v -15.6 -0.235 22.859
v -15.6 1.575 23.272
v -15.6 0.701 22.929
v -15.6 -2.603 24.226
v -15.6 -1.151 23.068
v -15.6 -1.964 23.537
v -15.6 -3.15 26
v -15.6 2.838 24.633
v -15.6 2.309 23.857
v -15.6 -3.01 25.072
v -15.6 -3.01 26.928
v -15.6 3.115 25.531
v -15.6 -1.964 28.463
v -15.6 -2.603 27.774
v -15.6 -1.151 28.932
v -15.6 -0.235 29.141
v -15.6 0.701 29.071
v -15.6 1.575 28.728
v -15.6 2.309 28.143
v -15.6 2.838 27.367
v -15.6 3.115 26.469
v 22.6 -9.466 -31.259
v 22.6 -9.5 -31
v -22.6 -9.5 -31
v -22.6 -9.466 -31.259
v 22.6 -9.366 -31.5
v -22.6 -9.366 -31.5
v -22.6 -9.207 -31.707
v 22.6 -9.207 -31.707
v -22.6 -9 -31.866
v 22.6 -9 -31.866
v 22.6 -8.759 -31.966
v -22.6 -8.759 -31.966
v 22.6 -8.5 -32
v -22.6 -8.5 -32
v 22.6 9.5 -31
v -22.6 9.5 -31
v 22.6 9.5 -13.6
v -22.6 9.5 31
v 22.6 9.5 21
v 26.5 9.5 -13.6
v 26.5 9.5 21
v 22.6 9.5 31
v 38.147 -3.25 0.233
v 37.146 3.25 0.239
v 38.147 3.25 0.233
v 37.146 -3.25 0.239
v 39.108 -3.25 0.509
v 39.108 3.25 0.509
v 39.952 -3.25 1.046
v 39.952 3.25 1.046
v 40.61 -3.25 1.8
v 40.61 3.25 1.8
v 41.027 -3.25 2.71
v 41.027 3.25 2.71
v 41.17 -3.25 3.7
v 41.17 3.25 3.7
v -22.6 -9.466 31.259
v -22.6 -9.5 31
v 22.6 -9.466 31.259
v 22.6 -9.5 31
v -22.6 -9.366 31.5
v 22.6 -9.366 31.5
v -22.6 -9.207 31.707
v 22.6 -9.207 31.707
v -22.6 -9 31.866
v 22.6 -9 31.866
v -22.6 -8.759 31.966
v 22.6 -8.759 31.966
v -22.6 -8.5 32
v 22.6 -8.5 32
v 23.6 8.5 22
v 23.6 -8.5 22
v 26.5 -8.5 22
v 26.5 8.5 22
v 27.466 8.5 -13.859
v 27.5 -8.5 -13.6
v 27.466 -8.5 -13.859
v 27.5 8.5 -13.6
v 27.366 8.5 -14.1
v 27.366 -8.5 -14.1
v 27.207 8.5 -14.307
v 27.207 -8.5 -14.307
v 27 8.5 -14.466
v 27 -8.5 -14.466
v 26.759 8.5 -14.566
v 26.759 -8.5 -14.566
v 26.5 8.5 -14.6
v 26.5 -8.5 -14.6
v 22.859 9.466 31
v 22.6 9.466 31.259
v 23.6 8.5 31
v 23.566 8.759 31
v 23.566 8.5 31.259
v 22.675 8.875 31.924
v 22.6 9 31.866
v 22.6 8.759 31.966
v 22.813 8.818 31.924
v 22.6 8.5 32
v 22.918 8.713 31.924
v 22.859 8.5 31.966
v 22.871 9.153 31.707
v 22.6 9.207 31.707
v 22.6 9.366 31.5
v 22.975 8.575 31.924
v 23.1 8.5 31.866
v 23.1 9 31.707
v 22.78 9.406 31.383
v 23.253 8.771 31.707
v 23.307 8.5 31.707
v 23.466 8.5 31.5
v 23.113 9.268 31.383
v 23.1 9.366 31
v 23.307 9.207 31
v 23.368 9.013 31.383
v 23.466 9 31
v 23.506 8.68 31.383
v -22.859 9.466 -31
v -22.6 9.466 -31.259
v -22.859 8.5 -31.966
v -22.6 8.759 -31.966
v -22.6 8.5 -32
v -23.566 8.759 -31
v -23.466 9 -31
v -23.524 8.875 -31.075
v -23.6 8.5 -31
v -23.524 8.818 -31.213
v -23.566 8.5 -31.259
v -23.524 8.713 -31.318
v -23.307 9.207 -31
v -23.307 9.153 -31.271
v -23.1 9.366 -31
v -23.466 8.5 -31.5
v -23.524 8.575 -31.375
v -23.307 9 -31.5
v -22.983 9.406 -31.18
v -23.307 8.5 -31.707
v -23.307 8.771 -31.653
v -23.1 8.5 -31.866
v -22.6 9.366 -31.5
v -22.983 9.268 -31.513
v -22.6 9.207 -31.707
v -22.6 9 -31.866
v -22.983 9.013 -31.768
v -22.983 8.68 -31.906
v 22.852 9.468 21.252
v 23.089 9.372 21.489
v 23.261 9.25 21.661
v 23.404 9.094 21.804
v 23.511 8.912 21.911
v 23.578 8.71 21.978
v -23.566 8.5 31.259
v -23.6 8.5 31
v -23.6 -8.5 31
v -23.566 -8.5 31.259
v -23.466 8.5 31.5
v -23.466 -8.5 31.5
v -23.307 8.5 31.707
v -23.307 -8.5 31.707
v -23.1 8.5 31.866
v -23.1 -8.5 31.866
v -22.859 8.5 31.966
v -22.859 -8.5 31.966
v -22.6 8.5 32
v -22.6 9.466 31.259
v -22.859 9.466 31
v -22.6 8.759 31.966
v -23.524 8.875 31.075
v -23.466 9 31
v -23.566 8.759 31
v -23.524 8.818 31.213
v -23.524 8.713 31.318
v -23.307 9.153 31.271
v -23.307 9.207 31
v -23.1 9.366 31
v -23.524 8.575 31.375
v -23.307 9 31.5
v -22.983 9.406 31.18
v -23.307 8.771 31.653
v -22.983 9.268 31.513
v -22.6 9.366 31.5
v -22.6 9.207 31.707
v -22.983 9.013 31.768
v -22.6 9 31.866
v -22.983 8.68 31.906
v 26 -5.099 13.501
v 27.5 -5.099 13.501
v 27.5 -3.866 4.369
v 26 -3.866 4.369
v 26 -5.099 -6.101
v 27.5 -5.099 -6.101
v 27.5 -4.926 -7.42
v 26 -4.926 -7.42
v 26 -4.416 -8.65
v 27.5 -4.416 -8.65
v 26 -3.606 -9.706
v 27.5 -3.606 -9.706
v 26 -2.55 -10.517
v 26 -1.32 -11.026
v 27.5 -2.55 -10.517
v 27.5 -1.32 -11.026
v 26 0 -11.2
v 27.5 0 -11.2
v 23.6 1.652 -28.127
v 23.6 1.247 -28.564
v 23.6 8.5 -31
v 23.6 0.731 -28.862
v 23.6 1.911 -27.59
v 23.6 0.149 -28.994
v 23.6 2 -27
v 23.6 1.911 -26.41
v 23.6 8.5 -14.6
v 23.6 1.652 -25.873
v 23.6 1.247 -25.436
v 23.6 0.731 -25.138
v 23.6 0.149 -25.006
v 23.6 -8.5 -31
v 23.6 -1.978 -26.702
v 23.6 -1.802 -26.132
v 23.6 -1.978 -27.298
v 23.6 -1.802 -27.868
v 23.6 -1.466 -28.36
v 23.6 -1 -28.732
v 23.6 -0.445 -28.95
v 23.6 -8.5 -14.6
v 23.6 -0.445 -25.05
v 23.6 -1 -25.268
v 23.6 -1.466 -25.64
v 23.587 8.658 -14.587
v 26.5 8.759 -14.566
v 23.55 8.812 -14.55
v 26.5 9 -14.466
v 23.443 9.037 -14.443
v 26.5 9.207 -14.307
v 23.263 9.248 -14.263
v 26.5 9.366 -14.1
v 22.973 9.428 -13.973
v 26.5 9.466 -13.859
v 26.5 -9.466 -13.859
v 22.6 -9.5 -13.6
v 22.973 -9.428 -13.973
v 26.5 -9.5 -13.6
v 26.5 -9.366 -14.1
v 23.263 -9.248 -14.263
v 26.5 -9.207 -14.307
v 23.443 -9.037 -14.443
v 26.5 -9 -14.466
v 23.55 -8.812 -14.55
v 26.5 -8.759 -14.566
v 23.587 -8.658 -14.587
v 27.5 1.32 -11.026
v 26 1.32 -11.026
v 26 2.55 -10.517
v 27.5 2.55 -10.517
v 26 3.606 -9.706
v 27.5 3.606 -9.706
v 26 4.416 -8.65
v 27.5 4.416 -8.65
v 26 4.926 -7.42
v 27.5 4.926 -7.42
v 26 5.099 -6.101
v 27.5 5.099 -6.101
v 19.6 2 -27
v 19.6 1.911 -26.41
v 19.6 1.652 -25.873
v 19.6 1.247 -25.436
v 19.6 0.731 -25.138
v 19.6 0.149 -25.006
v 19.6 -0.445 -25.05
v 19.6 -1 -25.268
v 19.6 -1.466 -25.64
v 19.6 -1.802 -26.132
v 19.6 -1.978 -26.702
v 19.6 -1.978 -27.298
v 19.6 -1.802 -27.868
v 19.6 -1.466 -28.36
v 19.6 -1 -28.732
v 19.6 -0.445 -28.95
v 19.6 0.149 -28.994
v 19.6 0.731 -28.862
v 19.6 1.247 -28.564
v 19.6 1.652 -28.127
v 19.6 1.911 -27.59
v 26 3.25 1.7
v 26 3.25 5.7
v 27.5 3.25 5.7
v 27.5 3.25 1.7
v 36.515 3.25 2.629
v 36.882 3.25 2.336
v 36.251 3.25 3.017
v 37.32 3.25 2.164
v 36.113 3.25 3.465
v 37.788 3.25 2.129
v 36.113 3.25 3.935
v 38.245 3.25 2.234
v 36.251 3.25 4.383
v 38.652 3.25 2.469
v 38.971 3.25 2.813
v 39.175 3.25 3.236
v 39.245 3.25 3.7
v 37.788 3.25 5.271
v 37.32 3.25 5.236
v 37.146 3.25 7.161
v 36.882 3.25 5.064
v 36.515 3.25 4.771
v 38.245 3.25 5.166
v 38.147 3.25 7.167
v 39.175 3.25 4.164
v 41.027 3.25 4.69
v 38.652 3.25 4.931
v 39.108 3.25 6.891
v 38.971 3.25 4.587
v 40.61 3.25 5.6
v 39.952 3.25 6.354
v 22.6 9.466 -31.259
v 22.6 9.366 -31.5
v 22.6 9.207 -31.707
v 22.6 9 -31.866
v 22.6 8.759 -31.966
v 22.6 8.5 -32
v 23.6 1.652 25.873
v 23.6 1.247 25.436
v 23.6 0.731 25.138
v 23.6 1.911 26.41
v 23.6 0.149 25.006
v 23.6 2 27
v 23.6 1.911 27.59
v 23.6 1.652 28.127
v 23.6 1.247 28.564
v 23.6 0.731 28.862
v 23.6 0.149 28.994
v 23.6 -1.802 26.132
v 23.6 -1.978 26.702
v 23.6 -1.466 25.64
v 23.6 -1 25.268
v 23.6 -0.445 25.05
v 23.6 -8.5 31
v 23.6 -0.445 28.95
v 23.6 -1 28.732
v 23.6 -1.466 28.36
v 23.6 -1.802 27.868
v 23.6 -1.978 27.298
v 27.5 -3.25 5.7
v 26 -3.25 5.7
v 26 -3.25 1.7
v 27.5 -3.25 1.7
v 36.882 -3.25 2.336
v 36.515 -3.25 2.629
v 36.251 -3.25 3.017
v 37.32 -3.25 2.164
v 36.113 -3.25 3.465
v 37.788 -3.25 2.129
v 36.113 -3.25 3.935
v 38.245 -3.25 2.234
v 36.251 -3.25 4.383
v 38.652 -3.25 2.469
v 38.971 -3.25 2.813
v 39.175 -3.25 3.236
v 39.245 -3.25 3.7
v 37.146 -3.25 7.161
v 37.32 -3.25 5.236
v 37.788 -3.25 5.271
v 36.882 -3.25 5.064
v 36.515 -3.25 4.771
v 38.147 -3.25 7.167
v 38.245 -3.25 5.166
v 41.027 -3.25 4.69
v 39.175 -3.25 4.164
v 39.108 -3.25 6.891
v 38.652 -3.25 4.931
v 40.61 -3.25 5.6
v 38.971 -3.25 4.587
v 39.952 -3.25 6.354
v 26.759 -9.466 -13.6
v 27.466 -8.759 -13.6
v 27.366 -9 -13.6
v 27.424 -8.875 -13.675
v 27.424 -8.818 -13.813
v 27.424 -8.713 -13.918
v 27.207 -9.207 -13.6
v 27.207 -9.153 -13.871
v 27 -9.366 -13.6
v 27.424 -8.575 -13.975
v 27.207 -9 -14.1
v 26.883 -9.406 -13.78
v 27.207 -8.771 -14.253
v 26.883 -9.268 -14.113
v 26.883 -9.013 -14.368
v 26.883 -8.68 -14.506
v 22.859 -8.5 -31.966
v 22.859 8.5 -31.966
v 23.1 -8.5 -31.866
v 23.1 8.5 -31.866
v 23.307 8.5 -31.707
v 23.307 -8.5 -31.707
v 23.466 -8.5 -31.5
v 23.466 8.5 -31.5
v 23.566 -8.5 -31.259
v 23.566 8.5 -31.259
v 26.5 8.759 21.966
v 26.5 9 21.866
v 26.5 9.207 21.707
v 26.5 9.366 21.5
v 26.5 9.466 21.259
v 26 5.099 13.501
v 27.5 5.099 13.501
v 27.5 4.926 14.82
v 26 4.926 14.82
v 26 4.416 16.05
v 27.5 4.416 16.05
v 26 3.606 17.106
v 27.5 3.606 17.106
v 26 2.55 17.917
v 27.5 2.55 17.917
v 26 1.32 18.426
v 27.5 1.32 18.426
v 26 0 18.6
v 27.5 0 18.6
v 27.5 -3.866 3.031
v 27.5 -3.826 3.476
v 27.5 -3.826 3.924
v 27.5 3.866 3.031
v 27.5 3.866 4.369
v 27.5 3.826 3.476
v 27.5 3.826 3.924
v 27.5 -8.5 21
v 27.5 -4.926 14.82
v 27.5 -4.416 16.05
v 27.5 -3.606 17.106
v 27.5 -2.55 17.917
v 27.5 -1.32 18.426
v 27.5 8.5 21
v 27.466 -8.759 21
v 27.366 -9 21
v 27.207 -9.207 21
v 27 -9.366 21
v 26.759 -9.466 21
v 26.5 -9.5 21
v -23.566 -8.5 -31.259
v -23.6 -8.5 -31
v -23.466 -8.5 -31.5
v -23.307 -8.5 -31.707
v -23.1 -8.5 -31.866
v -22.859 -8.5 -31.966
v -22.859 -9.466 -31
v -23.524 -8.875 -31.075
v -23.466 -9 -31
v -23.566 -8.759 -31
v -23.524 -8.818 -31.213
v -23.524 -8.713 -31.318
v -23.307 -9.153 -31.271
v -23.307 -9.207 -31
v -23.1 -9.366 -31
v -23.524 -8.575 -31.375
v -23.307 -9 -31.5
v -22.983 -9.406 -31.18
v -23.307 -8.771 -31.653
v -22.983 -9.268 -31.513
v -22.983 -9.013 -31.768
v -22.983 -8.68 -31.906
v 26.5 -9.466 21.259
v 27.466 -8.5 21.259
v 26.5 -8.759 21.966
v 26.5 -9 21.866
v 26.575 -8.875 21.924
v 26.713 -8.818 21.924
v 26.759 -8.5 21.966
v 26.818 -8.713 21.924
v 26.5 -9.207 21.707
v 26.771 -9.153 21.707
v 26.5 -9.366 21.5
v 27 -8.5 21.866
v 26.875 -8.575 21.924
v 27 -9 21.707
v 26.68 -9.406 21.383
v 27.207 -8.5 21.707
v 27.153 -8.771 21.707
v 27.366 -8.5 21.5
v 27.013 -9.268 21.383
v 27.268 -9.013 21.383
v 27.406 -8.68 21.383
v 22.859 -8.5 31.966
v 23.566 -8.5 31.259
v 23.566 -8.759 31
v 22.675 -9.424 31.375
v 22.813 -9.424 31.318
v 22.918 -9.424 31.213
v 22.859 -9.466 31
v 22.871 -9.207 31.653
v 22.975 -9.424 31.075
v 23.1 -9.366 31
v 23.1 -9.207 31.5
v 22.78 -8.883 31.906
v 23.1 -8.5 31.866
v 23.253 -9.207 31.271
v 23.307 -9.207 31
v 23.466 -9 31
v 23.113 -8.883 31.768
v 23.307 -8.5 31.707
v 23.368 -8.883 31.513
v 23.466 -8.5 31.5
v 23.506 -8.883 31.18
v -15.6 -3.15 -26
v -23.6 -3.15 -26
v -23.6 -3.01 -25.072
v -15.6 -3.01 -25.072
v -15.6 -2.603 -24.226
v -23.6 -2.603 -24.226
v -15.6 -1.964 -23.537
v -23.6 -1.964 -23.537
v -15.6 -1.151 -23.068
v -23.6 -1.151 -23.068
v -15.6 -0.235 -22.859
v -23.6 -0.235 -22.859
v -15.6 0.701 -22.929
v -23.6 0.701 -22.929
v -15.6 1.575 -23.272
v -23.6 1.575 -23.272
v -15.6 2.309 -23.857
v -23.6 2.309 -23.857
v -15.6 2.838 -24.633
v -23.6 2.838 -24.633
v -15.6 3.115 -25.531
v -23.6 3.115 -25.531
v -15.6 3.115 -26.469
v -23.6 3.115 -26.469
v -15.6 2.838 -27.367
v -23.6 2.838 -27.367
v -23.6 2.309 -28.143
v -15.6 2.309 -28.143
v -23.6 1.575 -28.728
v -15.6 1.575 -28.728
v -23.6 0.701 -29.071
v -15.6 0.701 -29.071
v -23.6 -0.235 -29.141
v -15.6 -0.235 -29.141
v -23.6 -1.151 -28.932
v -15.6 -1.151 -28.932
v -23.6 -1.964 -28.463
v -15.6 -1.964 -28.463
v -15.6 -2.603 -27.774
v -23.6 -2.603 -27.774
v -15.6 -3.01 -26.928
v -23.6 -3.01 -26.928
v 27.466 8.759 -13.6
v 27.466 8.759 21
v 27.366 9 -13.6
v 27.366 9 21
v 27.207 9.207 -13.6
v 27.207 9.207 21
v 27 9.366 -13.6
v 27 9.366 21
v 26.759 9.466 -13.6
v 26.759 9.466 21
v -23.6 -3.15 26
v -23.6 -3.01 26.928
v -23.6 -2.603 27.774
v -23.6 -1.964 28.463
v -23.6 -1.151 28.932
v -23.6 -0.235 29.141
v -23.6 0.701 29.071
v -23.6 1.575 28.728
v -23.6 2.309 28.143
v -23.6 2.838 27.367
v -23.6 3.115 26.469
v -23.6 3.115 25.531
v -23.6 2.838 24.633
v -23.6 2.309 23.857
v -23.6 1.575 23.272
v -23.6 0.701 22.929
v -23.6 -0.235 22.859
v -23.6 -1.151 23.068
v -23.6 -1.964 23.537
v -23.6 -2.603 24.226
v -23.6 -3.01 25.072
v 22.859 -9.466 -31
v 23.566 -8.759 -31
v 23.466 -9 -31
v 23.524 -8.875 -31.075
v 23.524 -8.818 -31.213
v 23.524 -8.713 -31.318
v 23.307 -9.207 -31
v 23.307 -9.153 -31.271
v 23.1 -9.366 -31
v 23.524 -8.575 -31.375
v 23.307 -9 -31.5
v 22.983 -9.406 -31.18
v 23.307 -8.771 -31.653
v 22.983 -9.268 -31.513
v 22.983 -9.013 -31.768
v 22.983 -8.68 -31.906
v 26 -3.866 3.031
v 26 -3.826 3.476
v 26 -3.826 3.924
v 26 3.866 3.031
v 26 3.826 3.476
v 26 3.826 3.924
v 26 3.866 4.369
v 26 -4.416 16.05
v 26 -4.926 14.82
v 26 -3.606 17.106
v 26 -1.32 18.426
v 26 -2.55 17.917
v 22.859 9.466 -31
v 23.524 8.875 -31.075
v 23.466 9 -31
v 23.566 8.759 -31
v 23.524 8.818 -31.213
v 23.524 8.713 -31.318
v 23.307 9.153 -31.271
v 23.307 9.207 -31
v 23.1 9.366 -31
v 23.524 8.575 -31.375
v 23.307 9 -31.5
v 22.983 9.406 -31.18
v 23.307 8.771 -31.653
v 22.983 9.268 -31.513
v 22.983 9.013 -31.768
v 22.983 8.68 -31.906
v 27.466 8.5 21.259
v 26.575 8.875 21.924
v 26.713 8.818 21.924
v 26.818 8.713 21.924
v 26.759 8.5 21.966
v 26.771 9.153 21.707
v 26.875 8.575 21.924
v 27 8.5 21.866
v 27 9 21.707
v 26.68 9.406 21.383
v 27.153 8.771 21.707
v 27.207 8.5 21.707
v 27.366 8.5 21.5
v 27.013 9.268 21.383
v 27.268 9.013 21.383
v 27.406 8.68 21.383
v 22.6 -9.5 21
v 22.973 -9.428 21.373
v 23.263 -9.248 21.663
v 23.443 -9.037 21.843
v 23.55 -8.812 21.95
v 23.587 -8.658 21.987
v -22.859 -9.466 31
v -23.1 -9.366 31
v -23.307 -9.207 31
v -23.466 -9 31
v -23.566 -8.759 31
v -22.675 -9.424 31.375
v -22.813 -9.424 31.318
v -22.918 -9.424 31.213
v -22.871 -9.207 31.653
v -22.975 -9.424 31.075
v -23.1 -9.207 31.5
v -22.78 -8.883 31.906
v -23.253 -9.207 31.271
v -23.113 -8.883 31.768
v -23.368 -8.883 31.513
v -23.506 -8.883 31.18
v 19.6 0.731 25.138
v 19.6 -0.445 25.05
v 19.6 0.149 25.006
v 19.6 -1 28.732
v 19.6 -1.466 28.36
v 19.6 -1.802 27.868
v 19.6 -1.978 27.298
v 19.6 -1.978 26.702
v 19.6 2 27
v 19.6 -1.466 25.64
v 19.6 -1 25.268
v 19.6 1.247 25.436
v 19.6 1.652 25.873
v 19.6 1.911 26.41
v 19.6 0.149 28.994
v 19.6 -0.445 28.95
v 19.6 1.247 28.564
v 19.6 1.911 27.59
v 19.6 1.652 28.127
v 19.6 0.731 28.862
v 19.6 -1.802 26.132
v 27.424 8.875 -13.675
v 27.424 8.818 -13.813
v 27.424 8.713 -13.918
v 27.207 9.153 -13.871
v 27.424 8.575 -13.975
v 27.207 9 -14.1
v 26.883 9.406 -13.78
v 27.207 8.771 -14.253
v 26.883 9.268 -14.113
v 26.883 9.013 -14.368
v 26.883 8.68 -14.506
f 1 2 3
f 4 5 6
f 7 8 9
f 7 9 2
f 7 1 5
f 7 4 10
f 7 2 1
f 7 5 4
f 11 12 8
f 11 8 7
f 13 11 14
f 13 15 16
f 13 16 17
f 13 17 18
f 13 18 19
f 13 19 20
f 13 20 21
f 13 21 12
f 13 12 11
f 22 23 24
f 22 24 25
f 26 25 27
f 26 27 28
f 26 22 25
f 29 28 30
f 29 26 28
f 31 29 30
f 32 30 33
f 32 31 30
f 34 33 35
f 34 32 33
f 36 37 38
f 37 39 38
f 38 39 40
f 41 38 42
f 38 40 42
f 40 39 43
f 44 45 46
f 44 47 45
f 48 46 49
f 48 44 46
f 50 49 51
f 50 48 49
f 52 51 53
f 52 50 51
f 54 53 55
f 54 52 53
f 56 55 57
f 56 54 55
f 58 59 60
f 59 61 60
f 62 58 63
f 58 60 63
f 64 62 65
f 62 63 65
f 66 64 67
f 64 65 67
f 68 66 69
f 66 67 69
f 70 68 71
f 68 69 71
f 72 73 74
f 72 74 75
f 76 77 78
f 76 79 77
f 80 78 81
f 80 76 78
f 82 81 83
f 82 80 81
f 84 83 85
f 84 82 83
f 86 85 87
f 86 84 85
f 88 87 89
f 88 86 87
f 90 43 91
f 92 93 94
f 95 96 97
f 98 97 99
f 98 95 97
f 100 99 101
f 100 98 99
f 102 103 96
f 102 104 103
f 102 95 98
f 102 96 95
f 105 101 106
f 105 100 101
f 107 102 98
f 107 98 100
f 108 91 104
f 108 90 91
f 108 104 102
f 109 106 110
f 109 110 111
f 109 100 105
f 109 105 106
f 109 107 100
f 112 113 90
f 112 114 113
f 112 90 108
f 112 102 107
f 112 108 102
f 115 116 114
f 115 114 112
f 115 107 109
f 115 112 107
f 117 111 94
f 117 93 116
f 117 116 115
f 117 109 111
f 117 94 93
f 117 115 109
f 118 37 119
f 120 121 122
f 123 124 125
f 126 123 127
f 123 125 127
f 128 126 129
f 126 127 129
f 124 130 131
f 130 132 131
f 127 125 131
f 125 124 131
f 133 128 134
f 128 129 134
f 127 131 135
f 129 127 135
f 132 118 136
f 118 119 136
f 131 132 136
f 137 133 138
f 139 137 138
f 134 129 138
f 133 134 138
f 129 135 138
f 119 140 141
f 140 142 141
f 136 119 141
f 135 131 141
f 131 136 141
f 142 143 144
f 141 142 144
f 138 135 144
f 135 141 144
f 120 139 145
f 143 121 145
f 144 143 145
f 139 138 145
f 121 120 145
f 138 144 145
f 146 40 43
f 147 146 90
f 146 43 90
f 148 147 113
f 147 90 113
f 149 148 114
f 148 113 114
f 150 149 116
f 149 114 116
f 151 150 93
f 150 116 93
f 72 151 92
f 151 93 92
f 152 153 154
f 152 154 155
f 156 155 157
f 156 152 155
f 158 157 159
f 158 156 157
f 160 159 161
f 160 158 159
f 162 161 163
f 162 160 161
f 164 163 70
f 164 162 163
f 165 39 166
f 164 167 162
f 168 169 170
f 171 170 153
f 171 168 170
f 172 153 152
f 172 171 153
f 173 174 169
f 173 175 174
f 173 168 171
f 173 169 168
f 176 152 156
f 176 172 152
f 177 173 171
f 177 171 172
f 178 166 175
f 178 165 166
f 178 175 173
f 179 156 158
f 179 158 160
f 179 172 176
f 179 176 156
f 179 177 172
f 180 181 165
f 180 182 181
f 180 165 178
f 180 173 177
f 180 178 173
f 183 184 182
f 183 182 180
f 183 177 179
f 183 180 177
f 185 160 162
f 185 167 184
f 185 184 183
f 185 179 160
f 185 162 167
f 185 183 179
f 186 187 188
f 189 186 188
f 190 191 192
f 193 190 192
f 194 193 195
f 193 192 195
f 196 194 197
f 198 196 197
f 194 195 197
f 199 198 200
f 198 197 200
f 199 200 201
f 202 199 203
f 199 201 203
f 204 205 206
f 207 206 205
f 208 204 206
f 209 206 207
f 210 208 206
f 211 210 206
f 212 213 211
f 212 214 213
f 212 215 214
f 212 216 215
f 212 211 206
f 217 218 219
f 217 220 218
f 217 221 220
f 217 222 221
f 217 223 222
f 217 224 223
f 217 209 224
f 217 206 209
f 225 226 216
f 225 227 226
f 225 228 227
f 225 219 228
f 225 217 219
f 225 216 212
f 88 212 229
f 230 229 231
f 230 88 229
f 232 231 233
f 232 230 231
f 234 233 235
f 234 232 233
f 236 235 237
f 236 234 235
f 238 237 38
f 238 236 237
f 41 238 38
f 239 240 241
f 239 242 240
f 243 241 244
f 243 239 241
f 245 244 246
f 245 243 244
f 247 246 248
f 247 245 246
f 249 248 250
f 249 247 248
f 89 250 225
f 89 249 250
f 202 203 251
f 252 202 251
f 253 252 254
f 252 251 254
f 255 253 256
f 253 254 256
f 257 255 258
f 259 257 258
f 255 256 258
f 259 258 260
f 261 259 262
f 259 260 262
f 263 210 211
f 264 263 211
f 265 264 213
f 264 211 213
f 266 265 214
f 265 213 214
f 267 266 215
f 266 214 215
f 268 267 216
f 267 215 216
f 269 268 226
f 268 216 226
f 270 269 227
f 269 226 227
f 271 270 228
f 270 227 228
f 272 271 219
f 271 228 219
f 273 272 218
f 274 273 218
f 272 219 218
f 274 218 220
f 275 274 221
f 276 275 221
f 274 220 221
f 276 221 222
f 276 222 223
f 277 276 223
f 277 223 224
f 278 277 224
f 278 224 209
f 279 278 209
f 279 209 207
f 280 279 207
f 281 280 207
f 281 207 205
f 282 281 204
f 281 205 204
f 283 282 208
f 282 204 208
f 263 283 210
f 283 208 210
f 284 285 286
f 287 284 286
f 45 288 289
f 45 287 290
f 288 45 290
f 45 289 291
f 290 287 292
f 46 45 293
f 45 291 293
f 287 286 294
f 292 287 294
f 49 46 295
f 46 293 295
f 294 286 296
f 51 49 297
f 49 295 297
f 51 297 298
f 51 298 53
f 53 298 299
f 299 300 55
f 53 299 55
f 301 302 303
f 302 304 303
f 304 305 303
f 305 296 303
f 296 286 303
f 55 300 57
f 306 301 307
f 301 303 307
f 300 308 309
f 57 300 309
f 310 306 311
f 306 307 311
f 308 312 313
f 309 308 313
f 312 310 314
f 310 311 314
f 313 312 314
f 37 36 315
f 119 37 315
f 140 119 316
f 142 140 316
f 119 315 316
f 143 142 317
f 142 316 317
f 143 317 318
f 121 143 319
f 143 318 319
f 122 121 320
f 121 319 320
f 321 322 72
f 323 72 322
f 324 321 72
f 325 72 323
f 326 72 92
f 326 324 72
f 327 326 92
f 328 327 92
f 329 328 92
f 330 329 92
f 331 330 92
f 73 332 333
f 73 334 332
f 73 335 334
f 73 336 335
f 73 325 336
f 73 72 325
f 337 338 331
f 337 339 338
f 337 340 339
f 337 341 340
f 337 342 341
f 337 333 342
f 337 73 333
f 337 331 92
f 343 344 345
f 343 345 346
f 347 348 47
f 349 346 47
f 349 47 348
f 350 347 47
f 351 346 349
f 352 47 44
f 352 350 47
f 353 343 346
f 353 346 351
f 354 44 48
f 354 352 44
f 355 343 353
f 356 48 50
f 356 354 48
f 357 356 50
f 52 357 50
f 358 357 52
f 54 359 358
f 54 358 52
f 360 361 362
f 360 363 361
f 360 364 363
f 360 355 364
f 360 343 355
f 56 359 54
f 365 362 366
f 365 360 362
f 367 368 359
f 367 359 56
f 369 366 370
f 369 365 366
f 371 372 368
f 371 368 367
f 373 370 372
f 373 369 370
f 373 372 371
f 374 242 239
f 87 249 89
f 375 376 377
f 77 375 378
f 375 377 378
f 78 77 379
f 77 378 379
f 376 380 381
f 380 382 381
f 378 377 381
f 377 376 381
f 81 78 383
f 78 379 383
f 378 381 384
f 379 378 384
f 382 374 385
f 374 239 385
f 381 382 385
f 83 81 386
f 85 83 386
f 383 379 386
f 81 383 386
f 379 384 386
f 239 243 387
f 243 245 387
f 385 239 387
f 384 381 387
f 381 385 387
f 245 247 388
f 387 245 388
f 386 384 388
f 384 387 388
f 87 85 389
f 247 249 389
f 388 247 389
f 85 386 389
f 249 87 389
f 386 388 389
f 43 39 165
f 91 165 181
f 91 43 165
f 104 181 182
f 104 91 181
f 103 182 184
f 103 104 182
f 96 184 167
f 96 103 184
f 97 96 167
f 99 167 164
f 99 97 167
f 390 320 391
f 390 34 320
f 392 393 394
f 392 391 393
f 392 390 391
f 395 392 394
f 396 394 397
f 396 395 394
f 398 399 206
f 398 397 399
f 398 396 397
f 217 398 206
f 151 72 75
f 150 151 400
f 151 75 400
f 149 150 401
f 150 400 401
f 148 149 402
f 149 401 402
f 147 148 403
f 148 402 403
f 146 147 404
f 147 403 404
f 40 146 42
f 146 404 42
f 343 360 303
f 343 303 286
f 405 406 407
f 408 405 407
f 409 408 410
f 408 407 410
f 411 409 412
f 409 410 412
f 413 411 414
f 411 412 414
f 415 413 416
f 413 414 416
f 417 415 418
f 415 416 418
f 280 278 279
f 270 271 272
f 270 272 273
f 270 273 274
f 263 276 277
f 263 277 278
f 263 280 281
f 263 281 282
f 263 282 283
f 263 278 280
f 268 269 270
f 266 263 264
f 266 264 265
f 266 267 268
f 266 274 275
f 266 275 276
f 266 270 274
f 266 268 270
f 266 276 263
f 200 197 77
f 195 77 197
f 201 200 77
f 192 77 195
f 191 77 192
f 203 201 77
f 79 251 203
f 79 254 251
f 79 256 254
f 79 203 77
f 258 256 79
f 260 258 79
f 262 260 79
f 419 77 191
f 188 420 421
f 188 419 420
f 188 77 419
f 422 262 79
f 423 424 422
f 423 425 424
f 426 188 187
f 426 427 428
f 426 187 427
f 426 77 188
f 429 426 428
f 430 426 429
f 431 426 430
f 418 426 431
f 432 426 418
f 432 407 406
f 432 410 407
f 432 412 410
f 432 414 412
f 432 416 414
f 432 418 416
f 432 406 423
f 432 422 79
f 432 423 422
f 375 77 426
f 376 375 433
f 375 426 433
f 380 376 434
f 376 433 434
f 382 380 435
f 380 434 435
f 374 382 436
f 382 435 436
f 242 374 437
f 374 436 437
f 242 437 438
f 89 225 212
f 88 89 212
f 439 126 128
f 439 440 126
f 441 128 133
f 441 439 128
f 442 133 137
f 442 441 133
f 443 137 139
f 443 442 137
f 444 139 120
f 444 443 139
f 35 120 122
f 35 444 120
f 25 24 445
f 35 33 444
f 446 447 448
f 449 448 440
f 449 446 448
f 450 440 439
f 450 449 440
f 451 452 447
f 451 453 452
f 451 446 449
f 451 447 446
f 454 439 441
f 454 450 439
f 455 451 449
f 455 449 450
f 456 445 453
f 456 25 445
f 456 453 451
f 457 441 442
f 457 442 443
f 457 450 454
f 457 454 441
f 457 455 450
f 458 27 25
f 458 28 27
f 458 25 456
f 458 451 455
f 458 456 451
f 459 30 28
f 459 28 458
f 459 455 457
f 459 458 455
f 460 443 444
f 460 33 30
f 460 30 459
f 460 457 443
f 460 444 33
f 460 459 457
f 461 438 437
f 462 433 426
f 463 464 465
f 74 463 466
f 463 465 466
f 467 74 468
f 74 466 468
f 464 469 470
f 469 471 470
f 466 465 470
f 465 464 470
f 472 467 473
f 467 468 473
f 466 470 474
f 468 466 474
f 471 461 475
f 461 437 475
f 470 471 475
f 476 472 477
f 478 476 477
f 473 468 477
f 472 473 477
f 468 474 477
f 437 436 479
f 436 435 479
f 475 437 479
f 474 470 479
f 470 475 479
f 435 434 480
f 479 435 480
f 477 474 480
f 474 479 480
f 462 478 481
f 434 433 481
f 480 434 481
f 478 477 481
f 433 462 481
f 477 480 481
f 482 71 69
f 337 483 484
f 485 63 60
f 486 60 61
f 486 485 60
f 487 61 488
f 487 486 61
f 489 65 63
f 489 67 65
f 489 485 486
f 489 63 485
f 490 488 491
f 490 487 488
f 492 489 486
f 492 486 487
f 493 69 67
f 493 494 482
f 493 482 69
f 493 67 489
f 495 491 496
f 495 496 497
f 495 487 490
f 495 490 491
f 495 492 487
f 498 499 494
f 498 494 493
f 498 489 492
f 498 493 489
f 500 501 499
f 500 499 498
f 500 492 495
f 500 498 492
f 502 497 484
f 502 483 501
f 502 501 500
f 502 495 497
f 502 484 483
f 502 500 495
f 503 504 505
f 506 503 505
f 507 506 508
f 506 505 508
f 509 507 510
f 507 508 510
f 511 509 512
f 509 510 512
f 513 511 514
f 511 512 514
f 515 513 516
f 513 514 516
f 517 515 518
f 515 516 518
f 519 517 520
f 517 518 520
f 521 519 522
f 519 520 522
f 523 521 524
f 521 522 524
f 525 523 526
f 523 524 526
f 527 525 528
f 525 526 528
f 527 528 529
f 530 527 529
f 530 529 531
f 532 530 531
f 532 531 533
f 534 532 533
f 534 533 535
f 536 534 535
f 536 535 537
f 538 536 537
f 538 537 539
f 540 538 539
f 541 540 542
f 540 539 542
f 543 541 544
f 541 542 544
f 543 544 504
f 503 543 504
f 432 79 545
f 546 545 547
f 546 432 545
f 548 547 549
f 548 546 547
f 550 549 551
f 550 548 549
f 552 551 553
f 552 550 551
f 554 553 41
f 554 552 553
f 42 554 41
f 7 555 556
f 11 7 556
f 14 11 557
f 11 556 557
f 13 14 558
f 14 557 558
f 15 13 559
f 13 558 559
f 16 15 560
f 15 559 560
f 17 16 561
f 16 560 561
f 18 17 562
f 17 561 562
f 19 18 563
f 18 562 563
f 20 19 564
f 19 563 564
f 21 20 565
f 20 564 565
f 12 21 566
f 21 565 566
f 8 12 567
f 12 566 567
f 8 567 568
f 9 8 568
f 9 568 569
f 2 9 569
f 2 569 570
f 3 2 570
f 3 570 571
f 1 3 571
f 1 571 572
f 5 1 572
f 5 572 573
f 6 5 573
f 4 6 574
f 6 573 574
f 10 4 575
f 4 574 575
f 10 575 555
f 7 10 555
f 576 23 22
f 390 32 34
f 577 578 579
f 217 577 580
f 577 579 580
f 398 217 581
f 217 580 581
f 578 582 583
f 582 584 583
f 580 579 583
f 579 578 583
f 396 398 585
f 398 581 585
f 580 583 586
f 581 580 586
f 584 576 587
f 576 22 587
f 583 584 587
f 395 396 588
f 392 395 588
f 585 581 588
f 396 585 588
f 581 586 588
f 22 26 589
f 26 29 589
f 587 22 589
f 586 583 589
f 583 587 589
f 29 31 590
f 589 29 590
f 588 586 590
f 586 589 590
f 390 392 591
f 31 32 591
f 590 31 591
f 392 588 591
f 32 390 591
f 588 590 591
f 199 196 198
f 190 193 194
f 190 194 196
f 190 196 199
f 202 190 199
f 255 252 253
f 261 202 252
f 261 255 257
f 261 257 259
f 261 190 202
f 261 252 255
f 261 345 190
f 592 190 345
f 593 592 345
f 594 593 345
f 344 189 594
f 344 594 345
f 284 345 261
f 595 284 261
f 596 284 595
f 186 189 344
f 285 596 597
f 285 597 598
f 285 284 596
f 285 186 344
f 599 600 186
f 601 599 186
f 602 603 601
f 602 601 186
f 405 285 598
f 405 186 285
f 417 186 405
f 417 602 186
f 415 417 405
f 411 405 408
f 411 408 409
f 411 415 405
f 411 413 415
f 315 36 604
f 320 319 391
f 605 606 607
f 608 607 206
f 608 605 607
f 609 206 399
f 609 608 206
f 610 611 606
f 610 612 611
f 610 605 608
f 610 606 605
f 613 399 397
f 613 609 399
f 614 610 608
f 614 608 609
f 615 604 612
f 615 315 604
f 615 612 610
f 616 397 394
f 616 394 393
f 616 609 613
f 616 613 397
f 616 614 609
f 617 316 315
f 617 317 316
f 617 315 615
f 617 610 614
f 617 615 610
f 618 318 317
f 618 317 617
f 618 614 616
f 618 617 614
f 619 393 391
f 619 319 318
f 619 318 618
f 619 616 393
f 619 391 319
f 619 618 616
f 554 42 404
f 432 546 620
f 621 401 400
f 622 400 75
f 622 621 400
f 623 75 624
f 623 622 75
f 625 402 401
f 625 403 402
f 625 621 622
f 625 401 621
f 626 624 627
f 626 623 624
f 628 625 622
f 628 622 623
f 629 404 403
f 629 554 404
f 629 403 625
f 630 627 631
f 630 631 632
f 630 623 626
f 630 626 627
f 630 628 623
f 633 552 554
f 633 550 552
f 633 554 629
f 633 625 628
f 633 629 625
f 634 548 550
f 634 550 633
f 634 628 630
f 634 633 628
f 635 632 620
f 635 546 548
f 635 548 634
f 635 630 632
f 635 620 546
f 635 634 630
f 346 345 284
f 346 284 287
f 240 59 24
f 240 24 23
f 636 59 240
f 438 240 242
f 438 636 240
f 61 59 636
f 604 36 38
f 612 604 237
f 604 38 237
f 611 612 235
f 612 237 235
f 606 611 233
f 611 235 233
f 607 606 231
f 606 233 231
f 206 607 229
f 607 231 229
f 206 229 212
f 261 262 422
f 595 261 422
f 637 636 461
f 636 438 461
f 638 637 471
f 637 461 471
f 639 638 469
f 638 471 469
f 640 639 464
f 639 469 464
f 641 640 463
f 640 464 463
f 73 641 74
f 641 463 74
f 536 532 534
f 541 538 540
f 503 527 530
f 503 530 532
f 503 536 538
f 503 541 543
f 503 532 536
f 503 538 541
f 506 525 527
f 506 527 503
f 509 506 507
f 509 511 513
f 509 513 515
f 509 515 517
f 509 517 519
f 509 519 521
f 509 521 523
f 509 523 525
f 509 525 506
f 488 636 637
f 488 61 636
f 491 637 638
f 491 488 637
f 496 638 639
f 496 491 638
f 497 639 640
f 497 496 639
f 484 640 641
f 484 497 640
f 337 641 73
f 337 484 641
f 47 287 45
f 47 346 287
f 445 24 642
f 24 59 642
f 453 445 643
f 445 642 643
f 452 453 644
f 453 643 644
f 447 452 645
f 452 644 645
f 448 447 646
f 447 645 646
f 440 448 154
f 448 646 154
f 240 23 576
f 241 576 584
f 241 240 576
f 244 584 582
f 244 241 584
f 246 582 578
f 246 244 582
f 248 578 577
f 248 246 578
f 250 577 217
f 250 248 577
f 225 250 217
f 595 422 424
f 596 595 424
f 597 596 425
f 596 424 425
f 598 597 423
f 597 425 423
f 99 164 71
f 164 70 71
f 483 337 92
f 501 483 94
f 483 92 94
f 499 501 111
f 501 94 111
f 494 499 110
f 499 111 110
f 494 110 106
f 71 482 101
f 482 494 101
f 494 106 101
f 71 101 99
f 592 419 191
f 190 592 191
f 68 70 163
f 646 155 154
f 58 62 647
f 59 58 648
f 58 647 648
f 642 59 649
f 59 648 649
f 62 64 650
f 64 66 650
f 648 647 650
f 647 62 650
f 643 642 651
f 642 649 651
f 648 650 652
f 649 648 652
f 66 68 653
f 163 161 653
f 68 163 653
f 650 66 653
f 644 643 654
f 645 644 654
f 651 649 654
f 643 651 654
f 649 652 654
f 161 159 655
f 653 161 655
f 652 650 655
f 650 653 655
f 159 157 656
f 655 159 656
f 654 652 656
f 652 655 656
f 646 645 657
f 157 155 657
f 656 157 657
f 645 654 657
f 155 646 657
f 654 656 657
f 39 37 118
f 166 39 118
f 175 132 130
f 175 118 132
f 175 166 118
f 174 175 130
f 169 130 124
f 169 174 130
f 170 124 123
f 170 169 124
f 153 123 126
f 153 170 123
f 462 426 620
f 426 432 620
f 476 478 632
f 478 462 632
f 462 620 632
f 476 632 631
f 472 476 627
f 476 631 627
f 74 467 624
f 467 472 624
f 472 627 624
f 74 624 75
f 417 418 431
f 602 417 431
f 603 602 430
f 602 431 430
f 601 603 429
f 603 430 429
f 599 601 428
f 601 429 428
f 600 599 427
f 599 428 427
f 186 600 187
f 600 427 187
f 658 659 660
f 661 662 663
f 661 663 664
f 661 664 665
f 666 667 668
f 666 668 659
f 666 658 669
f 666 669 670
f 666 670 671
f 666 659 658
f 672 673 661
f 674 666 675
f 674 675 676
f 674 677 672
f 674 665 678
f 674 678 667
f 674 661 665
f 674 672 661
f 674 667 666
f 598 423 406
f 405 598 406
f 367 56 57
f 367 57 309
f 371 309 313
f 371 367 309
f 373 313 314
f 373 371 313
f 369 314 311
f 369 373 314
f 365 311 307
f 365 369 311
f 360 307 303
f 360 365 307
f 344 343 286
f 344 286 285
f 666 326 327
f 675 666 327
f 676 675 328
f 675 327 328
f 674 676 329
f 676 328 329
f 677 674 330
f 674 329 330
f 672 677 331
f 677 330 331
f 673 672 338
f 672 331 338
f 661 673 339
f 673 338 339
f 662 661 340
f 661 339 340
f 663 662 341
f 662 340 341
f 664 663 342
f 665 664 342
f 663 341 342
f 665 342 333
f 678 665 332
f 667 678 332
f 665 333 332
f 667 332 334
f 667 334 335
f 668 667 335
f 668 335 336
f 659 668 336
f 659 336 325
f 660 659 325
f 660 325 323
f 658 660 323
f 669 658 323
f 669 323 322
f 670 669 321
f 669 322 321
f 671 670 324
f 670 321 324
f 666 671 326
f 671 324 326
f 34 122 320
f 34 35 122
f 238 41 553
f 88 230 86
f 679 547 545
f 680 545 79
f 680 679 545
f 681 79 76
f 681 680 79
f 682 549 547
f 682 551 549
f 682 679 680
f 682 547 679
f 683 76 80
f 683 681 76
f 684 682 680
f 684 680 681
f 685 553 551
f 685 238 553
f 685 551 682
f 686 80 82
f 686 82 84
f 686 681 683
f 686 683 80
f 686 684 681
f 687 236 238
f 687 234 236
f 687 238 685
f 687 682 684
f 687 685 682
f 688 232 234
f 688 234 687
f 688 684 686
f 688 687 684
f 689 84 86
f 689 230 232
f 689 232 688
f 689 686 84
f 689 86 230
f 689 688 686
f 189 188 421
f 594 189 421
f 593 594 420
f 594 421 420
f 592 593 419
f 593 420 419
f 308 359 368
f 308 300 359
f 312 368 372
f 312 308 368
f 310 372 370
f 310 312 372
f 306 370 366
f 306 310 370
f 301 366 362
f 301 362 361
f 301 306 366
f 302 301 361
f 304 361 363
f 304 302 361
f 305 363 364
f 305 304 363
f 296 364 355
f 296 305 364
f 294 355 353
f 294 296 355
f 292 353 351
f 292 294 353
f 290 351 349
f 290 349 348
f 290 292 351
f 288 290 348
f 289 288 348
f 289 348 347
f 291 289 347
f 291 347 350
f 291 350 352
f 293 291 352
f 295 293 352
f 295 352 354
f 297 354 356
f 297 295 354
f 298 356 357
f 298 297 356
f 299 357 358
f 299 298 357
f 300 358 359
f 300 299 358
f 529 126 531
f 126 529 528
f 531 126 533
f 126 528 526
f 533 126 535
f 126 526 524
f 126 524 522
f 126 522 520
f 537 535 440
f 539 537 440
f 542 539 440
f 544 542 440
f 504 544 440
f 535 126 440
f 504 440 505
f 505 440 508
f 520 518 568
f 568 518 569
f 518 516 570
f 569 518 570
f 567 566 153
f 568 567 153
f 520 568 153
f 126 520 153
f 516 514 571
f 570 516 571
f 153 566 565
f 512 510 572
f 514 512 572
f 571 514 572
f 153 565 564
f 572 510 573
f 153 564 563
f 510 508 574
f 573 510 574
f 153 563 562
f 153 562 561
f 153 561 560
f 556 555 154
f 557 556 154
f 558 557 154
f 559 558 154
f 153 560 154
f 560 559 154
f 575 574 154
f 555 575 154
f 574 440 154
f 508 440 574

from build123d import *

# Parameters (mm, degrees)
F0_W      = 47.2
F0_H      = 64
F1_DEPTH  = 9.5
F2_W      = 19
F2_H      = 36.6
F3_DEPTH  = 3.9
F5_DEPTH  = 1.5
F6_R      = 3.15
F7_DEPTH  = 8
F8_R      = 2
F9_DEPTH  = 4
F10_R     = 1.575
F11_DEPTH = 3.25
F12_R     = 1


with BuildPart() as f1:
    # F0 (on Front) → F1 (new body, symmetric)
    with BuildSketch(Plane.XZ):
        Rectangle(F0_W, F0_H)
    extrude(amount=F1_DEPTH, both=True)

    # F2 (on face) → F3 (join)
    with BuildSketch(Plane.YZ.offset(23.6)):
        with Locations((0, 3.7)):
            Rectangle(F2_W, F2_H)
    extrude(amount=F3_DEPTH)

    # F4 (on face) → F5 (cut)
    with BuildSketch(Plane.YZ.offset(27.5)):
        with BuildLine():
            ThreePointArc((3.865939, 3.030682), (3.820938, 3.7), (3.865939, 4.369318))
            Line((3.865939, 4.369318), (5.099388, 13.500612))
            ThreePointArc((5.099388, 13.500612), (3.605812, 17.106424), (0, 18.6))
            ThreePointArc((0, 18.6), (-3.605812, 17.106424), (-5.099388, 13.500612))
            Line((-5.099388, 13.500612), (-3.865939, 4.369318))
            ThreePointArc((-3.865939, 4.369318), (-3.820938, 3.7), (-3.865939, 3.030682))
            Line((-3.865939, 3.030682), (-5.099388, -6.100612))
            ThreePointArc((-5.099388, -6.100612), (-3.605812, -9.706424), (0, -11.2))
            ThreePointArc((0, -11.2), (3.605812, -9.706424), (5.099388, -6.100612))
            Line((5.099388, -6.100612), (3.865939, 3.030682))
        make_face()
    extrude(amount=-F5_DEPTH, mode=Mode.SUBTRACT)

    # F6 (on face) → F7 (cut)
    with BuildSketch(Plane(origin=(-23.6, 0, 0), x_dir=(0, -1, 0), z_dir=(-1, 0, 0))):
        with Locations((0, 26)):
            Circle(F6_R)
        with Locations((0, -26)):
            Circle(F6_R)
    extrude(amount=-F7_DEPTH, mode=Mode.SUBTRACT)

    # F8 (on face) → F9 (cut)
    with BuildSketch(Plane.YZ.offset(23.6)):
        with Locations((0, 27)):
            Circle(F8_R)
        with Locations((0, -27)):
            Circle(F8_R)
    extrude(amount=-F9_DEPTH, mode=Mode.SUBTRACT)

    # F10 (on Front) → F11 (join, symmetric)
    with BuildSketch(Plane.XZ):
        with BuildLine():
            ThreePointArc((37.146019, 0.239445), (39.952111, 1.046329), (41.17, 3.7))
            ThreePointArc((41.17, 3.7), (39.952111, 6.353671), (37.146019, 7.160555))
            ThreePointArc((37.146019, 7.160555), (34.17, 3.7), (37.146019, 0.239445))
        make_face()
        with Locations((37.67, 3.7)):
            Circle(F10_R, mode=Mode.SUBTRACT)
        with BuildLine():
            ThreePointArc((37.146019, 0.239445), (34.17, 3.7), (37.146019, 7.160555))
            Line((37.146019, 7.160555), (27.5, 5.7))
            Line((27.5, 5.7), (25.5, 5.7))
            Line((25.5, 5.7), (25.5, 1.7))
            Line((25.5, 1.7), (27.5, 1.7))
            Line((27.5, 1.7), (37.146019, 0.239445))
        make_face()
    extrude(amount=F11_DEPTH, both=True)

    # F12
    f12_edges = [f1.edges().sort_by_distance(p)[0] for p in [
        (0, 9.5, -32),
        (23.6, 9.5, -23.3),
        (25.55, 9.5, -14.6),
        (27.5, 9.5, 3.7),
        (25.55, 9.5, 22),
        (23.6, 9.5, 27),
        (0, 9.5, 32),
        (-23.6, 9.5, 0),
        (23.6, 0, 32),
        (-23.6, 0, 32),
        (0, -9.5, 32),
        (0, -9.5, -32),
        (23.6, -9.5, -23.3),
        (25.55, -9.5, -14.6),
        (27.5, -9.5, 3.7),
        (25.55, -9.5, 22),
        (23.6, -9.5, 27),
        (-23.6, -9.5, 0),
        (27.5, 0, -14.6),
        (27.5, 0, 22),
        (23.6, 0, -32),
        (-23.6, 0, -32),
    ]]
    fillet(f12_edges, radius=F12_R)


solid = f1.part
